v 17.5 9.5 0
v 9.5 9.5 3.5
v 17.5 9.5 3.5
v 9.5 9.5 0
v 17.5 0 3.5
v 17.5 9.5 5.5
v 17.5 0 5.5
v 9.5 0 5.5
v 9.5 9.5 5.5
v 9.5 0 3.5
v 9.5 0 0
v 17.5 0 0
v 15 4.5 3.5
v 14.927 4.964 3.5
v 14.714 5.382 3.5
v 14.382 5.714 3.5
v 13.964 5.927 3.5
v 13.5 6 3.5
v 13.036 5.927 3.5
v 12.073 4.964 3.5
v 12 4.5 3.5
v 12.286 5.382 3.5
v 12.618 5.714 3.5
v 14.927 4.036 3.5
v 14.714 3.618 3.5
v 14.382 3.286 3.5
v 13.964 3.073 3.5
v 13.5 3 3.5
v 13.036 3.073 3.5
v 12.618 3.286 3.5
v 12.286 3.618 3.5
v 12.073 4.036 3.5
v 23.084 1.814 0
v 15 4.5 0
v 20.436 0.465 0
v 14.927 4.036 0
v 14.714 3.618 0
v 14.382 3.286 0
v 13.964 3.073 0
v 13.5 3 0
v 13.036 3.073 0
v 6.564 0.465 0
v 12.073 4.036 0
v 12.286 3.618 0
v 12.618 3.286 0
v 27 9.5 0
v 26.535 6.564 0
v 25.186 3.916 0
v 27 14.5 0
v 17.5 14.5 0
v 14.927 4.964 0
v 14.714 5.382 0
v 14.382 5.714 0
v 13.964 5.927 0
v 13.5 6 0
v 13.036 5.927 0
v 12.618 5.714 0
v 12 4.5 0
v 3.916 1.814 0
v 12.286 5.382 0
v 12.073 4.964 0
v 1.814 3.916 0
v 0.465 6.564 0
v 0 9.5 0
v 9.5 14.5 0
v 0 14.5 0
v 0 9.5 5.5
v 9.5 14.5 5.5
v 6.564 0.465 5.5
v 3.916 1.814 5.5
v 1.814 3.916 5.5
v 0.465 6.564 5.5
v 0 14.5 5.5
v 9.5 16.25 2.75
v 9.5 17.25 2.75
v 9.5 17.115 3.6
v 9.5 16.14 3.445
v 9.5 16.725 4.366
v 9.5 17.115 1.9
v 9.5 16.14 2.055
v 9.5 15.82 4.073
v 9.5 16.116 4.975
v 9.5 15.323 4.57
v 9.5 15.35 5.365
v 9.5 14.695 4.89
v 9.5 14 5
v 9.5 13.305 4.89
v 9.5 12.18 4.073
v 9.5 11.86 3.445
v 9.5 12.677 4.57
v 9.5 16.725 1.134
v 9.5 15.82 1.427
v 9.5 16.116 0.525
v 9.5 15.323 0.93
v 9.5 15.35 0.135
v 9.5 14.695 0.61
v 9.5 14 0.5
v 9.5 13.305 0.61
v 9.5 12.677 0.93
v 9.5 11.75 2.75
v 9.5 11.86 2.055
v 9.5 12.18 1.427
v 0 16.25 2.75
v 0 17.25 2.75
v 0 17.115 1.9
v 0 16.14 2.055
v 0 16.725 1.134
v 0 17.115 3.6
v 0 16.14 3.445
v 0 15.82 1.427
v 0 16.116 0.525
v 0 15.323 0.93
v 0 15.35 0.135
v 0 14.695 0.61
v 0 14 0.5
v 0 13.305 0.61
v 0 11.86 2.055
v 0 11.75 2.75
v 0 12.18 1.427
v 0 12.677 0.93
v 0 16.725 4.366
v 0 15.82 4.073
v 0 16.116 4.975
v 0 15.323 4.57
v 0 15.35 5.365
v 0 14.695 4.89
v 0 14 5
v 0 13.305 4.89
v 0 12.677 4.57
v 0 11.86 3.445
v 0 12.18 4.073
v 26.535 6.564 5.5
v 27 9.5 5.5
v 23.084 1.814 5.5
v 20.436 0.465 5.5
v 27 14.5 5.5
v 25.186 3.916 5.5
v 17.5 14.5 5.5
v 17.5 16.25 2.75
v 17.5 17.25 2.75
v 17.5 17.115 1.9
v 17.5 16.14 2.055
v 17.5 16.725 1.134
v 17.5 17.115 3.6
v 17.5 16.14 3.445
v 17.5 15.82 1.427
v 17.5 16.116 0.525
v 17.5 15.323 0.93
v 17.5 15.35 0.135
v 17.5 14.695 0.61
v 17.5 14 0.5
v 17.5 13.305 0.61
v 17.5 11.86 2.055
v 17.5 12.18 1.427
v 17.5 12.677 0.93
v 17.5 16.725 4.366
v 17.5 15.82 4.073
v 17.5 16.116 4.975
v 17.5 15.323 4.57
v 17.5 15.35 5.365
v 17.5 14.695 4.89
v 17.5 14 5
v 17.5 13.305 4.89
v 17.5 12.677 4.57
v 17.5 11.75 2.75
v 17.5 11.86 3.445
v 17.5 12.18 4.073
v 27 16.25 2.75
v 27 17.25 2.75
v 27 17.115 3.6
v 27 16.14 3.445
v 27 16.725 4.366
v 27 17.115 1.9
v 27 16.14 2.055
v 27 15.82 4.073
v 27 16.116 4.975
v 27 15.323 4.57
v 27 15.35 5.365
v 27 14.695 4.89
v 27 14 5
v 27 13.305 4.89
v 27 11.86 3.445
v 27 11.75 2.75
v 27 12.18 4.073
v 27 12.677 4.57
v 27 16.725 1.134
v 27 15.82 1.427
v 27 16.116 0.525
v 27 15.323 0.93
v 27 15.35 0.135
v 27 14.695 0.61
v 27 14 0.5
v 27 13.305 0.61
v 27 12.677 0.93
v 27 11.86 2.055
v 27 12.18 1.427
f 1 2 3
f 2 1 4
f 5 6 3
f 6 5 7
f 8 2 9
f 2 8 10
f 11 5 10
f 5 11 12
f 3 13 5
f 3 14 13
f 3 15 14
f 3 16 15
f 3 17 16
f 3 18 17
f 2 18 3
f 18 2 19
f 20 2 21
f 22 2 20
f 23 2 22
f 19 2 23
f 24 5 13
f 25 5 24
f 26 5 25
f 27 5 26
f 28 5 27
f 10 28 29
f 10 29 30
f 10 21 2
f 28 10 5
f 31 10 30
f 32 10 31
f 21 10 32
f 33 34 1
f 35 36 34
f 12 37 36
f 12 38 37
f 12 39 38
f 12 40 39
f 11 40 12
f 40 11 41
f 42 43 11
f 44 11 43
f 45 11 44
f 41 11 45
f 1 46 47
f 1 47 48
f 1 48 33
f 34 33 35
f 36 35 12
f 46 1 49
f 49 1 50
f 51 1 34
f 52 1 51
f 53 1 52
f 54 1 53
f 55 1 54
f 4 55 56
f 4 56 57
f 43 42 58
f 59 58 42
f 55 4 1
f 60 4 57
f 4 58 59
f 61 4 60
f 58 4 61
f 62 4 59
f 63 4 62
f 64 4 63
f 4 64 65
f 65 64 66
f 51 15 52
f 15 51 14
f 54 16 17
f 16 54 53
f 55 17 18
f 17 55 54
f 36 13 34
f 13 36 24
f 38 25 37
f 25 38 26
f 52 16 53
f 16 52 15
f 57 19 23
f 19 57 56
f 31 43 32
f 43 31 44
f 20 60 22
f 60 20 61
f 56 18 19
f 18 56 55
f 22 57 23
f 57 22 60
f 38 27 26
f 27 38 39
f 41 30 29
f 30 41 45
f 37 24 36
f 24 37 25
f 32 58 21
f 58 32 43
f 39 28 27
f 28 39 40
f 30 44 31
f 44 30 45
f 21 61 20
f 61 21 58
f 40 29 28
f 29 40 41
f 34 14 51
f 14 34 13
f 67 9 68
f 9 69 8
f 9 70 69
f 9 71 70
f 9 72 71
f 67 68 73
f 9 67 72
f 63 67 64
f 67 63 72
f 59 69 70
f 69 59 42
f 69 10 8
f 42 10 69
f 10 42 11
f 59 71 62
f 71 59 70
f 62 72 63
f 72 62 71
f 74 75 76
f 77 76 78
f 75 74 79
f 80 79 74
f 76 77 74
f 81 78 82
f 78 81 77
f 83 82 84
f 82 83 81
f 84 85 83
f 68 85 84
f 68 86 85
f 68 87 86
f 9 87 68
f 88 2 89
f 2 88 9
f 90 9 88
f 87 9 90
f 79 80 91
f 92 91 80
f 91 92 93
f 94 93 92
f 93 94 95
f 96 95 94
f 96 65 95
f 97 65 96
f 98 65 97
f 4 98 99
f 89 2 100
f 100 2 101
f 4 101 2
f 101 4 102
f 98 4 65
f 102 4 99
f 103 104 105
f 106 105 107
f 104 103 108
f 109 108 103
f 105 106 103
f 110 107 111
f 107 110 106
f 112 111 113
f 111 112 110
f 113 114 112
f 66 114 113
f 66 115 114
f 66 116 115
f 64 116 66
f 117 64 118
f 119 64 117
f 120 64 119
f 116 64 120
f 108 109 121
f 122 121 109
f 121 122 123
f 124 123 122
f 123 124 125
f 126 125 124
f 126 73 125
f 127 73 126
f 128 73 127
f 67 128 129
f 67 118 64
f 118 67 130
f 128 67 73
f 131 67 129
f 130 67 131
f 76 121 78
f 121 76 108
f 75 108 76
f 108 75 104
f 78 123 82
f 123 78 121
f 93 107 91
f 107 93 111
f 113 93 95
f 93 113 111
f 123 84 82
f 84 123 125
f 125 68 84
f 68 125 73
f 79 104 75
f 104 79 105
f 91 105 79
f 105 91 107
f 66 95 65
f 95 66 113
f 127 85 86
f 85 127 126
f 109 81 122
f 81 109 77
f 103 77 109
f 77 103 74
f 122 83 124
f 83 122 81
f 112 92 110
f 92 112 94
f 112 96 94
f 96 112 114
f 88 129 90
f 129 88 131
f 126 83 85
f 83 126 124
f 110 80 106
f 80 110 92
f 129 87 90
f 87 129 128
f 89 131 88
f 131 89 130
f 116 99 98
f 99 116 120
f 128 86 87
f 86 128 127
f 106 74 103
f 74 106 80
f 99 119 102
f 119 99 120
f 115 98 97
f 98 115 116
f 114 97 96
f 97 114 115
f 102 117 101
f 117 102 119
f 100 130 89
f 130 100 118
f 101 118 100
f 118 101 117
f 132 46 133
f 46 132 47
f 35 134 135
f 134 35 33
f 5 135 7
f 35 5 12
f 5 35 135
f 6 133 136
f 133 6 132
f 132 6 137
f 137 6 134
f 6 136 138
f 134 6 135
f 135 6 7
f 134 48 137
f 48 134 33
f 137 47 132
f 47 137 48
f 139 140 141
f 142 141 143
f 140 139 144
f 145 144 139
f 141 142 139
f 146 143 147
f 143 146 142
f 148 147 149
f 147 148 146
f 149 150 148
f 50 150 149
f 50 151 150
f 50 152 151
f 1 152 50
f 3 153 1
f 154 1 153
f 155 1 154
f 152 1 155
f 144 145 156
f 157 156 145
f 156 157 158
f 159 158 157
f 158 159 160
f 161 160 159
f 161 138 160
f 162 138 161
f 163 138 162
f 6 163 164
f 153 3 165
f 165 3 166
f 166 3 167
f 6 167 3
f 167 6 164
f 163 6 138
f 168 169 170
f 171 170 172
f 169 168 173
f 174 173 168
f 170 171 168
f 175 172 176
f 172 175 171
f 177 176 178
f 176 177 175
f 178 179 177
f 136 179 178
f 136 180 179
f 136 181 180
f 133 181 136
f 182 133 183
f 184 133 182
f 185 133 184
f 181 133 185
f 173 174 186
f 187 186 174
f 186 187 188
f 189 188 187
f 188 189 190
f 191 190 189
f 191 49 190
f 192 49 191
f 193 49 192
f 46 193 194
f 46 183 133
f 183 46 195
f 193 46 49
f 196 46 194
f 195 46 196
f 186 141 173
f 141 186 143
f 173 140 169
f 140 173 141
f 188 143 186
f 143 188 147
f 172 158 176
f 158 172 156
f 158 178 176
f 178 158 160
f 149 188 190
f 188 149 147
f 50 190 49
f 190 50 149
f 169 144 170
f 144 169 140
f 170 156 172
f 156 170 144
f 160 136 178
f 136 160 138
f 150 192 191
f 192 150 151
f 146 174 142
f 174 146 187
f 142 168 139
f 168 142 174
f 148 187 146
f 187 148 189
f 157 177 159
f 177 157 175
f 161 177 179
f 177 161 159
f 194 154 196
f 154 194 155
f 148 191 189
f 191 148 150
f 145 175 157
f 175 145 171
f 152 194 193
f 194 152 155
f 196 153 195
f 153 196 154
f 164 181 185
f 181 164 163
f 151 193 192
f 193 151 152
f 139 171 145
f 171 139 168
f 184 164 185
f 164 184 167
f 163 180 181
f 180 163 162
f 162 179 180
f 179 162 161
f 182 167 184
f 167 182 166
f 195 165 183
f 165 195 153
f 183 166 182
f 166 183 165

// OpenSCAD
/*
 * Inspired by the "TinyBoy / Fabrikator mini Cam holder"
 * by "andy_a":
 * http://www.thingiverse.com/thing:1434698
 *
 * Created by:
 * Thomas Buck <xythobuz@xythobuz.de> in April 2016
 *
 * Licensed under the Creative Commons - Attribution license.
 */

//import("/Users/thomas/Downloads/TinyBoy___Fabrikator_mini_Cam_holder/files/tinyboy__fabrikator_mini_cam_holder.stl");

// -----------------------------------------------------------

$fn = 20;

// -----------------------------------------------------------

module quarter_circle(d, h) {
    difference() {
        cylinder(d = d, h = h);
        
        translate([0, -(d / 2) - 1, -1])
            cube([(d / 2) + 1, d + 2, h + 2]);
        
        translate([-(d / 2) - 1, 0, -1])
            cube([(d / 2) + 2, (d / 2) + 1, h + 2]);
    }
}

module webcam_shaft_center() {
    difference() {
        cube([9.5, 3.5, 8]);
        
        translate([4.5, 4, 4])
            rotate([90, 0, 0])
            cylinder(d = 3, h = 4.5);
    }
}

module webcam_shaft_end() {
    difference() {
        union() {
            // rectangular part
            translate([0, -5.5, 0])
                cube([5, 5.5, 9.5]);
            
            // front radius
            translate([5, -2.75, 0])
                cylinder(d = 5.5, h = 9.5);
            
            translate([0, 0, 9.5])
                rotate([90, 0, 0])
                quarter_circle(19, 5.5);
        }
    
        // axis hole
        translate([4.5, -2.75, -1])
            cylinder(d = 4.5, h = 11.5);
    }
}

module webcam_shaft() {
    translate([-0.5, -5.5, 9.5])
        webcam_shaft_center();

    translate([9, 0, 0])
        webcam_shaft_end();

    translate([9, -5.5, 27])
        rotate([0, 180, 180])
        webcam_shaft_end();
}

// -----------------------------------------------------------

translate([0, 0.5, 5.5])
    rotate([90, 0, 90])
    webcam_shaft();
